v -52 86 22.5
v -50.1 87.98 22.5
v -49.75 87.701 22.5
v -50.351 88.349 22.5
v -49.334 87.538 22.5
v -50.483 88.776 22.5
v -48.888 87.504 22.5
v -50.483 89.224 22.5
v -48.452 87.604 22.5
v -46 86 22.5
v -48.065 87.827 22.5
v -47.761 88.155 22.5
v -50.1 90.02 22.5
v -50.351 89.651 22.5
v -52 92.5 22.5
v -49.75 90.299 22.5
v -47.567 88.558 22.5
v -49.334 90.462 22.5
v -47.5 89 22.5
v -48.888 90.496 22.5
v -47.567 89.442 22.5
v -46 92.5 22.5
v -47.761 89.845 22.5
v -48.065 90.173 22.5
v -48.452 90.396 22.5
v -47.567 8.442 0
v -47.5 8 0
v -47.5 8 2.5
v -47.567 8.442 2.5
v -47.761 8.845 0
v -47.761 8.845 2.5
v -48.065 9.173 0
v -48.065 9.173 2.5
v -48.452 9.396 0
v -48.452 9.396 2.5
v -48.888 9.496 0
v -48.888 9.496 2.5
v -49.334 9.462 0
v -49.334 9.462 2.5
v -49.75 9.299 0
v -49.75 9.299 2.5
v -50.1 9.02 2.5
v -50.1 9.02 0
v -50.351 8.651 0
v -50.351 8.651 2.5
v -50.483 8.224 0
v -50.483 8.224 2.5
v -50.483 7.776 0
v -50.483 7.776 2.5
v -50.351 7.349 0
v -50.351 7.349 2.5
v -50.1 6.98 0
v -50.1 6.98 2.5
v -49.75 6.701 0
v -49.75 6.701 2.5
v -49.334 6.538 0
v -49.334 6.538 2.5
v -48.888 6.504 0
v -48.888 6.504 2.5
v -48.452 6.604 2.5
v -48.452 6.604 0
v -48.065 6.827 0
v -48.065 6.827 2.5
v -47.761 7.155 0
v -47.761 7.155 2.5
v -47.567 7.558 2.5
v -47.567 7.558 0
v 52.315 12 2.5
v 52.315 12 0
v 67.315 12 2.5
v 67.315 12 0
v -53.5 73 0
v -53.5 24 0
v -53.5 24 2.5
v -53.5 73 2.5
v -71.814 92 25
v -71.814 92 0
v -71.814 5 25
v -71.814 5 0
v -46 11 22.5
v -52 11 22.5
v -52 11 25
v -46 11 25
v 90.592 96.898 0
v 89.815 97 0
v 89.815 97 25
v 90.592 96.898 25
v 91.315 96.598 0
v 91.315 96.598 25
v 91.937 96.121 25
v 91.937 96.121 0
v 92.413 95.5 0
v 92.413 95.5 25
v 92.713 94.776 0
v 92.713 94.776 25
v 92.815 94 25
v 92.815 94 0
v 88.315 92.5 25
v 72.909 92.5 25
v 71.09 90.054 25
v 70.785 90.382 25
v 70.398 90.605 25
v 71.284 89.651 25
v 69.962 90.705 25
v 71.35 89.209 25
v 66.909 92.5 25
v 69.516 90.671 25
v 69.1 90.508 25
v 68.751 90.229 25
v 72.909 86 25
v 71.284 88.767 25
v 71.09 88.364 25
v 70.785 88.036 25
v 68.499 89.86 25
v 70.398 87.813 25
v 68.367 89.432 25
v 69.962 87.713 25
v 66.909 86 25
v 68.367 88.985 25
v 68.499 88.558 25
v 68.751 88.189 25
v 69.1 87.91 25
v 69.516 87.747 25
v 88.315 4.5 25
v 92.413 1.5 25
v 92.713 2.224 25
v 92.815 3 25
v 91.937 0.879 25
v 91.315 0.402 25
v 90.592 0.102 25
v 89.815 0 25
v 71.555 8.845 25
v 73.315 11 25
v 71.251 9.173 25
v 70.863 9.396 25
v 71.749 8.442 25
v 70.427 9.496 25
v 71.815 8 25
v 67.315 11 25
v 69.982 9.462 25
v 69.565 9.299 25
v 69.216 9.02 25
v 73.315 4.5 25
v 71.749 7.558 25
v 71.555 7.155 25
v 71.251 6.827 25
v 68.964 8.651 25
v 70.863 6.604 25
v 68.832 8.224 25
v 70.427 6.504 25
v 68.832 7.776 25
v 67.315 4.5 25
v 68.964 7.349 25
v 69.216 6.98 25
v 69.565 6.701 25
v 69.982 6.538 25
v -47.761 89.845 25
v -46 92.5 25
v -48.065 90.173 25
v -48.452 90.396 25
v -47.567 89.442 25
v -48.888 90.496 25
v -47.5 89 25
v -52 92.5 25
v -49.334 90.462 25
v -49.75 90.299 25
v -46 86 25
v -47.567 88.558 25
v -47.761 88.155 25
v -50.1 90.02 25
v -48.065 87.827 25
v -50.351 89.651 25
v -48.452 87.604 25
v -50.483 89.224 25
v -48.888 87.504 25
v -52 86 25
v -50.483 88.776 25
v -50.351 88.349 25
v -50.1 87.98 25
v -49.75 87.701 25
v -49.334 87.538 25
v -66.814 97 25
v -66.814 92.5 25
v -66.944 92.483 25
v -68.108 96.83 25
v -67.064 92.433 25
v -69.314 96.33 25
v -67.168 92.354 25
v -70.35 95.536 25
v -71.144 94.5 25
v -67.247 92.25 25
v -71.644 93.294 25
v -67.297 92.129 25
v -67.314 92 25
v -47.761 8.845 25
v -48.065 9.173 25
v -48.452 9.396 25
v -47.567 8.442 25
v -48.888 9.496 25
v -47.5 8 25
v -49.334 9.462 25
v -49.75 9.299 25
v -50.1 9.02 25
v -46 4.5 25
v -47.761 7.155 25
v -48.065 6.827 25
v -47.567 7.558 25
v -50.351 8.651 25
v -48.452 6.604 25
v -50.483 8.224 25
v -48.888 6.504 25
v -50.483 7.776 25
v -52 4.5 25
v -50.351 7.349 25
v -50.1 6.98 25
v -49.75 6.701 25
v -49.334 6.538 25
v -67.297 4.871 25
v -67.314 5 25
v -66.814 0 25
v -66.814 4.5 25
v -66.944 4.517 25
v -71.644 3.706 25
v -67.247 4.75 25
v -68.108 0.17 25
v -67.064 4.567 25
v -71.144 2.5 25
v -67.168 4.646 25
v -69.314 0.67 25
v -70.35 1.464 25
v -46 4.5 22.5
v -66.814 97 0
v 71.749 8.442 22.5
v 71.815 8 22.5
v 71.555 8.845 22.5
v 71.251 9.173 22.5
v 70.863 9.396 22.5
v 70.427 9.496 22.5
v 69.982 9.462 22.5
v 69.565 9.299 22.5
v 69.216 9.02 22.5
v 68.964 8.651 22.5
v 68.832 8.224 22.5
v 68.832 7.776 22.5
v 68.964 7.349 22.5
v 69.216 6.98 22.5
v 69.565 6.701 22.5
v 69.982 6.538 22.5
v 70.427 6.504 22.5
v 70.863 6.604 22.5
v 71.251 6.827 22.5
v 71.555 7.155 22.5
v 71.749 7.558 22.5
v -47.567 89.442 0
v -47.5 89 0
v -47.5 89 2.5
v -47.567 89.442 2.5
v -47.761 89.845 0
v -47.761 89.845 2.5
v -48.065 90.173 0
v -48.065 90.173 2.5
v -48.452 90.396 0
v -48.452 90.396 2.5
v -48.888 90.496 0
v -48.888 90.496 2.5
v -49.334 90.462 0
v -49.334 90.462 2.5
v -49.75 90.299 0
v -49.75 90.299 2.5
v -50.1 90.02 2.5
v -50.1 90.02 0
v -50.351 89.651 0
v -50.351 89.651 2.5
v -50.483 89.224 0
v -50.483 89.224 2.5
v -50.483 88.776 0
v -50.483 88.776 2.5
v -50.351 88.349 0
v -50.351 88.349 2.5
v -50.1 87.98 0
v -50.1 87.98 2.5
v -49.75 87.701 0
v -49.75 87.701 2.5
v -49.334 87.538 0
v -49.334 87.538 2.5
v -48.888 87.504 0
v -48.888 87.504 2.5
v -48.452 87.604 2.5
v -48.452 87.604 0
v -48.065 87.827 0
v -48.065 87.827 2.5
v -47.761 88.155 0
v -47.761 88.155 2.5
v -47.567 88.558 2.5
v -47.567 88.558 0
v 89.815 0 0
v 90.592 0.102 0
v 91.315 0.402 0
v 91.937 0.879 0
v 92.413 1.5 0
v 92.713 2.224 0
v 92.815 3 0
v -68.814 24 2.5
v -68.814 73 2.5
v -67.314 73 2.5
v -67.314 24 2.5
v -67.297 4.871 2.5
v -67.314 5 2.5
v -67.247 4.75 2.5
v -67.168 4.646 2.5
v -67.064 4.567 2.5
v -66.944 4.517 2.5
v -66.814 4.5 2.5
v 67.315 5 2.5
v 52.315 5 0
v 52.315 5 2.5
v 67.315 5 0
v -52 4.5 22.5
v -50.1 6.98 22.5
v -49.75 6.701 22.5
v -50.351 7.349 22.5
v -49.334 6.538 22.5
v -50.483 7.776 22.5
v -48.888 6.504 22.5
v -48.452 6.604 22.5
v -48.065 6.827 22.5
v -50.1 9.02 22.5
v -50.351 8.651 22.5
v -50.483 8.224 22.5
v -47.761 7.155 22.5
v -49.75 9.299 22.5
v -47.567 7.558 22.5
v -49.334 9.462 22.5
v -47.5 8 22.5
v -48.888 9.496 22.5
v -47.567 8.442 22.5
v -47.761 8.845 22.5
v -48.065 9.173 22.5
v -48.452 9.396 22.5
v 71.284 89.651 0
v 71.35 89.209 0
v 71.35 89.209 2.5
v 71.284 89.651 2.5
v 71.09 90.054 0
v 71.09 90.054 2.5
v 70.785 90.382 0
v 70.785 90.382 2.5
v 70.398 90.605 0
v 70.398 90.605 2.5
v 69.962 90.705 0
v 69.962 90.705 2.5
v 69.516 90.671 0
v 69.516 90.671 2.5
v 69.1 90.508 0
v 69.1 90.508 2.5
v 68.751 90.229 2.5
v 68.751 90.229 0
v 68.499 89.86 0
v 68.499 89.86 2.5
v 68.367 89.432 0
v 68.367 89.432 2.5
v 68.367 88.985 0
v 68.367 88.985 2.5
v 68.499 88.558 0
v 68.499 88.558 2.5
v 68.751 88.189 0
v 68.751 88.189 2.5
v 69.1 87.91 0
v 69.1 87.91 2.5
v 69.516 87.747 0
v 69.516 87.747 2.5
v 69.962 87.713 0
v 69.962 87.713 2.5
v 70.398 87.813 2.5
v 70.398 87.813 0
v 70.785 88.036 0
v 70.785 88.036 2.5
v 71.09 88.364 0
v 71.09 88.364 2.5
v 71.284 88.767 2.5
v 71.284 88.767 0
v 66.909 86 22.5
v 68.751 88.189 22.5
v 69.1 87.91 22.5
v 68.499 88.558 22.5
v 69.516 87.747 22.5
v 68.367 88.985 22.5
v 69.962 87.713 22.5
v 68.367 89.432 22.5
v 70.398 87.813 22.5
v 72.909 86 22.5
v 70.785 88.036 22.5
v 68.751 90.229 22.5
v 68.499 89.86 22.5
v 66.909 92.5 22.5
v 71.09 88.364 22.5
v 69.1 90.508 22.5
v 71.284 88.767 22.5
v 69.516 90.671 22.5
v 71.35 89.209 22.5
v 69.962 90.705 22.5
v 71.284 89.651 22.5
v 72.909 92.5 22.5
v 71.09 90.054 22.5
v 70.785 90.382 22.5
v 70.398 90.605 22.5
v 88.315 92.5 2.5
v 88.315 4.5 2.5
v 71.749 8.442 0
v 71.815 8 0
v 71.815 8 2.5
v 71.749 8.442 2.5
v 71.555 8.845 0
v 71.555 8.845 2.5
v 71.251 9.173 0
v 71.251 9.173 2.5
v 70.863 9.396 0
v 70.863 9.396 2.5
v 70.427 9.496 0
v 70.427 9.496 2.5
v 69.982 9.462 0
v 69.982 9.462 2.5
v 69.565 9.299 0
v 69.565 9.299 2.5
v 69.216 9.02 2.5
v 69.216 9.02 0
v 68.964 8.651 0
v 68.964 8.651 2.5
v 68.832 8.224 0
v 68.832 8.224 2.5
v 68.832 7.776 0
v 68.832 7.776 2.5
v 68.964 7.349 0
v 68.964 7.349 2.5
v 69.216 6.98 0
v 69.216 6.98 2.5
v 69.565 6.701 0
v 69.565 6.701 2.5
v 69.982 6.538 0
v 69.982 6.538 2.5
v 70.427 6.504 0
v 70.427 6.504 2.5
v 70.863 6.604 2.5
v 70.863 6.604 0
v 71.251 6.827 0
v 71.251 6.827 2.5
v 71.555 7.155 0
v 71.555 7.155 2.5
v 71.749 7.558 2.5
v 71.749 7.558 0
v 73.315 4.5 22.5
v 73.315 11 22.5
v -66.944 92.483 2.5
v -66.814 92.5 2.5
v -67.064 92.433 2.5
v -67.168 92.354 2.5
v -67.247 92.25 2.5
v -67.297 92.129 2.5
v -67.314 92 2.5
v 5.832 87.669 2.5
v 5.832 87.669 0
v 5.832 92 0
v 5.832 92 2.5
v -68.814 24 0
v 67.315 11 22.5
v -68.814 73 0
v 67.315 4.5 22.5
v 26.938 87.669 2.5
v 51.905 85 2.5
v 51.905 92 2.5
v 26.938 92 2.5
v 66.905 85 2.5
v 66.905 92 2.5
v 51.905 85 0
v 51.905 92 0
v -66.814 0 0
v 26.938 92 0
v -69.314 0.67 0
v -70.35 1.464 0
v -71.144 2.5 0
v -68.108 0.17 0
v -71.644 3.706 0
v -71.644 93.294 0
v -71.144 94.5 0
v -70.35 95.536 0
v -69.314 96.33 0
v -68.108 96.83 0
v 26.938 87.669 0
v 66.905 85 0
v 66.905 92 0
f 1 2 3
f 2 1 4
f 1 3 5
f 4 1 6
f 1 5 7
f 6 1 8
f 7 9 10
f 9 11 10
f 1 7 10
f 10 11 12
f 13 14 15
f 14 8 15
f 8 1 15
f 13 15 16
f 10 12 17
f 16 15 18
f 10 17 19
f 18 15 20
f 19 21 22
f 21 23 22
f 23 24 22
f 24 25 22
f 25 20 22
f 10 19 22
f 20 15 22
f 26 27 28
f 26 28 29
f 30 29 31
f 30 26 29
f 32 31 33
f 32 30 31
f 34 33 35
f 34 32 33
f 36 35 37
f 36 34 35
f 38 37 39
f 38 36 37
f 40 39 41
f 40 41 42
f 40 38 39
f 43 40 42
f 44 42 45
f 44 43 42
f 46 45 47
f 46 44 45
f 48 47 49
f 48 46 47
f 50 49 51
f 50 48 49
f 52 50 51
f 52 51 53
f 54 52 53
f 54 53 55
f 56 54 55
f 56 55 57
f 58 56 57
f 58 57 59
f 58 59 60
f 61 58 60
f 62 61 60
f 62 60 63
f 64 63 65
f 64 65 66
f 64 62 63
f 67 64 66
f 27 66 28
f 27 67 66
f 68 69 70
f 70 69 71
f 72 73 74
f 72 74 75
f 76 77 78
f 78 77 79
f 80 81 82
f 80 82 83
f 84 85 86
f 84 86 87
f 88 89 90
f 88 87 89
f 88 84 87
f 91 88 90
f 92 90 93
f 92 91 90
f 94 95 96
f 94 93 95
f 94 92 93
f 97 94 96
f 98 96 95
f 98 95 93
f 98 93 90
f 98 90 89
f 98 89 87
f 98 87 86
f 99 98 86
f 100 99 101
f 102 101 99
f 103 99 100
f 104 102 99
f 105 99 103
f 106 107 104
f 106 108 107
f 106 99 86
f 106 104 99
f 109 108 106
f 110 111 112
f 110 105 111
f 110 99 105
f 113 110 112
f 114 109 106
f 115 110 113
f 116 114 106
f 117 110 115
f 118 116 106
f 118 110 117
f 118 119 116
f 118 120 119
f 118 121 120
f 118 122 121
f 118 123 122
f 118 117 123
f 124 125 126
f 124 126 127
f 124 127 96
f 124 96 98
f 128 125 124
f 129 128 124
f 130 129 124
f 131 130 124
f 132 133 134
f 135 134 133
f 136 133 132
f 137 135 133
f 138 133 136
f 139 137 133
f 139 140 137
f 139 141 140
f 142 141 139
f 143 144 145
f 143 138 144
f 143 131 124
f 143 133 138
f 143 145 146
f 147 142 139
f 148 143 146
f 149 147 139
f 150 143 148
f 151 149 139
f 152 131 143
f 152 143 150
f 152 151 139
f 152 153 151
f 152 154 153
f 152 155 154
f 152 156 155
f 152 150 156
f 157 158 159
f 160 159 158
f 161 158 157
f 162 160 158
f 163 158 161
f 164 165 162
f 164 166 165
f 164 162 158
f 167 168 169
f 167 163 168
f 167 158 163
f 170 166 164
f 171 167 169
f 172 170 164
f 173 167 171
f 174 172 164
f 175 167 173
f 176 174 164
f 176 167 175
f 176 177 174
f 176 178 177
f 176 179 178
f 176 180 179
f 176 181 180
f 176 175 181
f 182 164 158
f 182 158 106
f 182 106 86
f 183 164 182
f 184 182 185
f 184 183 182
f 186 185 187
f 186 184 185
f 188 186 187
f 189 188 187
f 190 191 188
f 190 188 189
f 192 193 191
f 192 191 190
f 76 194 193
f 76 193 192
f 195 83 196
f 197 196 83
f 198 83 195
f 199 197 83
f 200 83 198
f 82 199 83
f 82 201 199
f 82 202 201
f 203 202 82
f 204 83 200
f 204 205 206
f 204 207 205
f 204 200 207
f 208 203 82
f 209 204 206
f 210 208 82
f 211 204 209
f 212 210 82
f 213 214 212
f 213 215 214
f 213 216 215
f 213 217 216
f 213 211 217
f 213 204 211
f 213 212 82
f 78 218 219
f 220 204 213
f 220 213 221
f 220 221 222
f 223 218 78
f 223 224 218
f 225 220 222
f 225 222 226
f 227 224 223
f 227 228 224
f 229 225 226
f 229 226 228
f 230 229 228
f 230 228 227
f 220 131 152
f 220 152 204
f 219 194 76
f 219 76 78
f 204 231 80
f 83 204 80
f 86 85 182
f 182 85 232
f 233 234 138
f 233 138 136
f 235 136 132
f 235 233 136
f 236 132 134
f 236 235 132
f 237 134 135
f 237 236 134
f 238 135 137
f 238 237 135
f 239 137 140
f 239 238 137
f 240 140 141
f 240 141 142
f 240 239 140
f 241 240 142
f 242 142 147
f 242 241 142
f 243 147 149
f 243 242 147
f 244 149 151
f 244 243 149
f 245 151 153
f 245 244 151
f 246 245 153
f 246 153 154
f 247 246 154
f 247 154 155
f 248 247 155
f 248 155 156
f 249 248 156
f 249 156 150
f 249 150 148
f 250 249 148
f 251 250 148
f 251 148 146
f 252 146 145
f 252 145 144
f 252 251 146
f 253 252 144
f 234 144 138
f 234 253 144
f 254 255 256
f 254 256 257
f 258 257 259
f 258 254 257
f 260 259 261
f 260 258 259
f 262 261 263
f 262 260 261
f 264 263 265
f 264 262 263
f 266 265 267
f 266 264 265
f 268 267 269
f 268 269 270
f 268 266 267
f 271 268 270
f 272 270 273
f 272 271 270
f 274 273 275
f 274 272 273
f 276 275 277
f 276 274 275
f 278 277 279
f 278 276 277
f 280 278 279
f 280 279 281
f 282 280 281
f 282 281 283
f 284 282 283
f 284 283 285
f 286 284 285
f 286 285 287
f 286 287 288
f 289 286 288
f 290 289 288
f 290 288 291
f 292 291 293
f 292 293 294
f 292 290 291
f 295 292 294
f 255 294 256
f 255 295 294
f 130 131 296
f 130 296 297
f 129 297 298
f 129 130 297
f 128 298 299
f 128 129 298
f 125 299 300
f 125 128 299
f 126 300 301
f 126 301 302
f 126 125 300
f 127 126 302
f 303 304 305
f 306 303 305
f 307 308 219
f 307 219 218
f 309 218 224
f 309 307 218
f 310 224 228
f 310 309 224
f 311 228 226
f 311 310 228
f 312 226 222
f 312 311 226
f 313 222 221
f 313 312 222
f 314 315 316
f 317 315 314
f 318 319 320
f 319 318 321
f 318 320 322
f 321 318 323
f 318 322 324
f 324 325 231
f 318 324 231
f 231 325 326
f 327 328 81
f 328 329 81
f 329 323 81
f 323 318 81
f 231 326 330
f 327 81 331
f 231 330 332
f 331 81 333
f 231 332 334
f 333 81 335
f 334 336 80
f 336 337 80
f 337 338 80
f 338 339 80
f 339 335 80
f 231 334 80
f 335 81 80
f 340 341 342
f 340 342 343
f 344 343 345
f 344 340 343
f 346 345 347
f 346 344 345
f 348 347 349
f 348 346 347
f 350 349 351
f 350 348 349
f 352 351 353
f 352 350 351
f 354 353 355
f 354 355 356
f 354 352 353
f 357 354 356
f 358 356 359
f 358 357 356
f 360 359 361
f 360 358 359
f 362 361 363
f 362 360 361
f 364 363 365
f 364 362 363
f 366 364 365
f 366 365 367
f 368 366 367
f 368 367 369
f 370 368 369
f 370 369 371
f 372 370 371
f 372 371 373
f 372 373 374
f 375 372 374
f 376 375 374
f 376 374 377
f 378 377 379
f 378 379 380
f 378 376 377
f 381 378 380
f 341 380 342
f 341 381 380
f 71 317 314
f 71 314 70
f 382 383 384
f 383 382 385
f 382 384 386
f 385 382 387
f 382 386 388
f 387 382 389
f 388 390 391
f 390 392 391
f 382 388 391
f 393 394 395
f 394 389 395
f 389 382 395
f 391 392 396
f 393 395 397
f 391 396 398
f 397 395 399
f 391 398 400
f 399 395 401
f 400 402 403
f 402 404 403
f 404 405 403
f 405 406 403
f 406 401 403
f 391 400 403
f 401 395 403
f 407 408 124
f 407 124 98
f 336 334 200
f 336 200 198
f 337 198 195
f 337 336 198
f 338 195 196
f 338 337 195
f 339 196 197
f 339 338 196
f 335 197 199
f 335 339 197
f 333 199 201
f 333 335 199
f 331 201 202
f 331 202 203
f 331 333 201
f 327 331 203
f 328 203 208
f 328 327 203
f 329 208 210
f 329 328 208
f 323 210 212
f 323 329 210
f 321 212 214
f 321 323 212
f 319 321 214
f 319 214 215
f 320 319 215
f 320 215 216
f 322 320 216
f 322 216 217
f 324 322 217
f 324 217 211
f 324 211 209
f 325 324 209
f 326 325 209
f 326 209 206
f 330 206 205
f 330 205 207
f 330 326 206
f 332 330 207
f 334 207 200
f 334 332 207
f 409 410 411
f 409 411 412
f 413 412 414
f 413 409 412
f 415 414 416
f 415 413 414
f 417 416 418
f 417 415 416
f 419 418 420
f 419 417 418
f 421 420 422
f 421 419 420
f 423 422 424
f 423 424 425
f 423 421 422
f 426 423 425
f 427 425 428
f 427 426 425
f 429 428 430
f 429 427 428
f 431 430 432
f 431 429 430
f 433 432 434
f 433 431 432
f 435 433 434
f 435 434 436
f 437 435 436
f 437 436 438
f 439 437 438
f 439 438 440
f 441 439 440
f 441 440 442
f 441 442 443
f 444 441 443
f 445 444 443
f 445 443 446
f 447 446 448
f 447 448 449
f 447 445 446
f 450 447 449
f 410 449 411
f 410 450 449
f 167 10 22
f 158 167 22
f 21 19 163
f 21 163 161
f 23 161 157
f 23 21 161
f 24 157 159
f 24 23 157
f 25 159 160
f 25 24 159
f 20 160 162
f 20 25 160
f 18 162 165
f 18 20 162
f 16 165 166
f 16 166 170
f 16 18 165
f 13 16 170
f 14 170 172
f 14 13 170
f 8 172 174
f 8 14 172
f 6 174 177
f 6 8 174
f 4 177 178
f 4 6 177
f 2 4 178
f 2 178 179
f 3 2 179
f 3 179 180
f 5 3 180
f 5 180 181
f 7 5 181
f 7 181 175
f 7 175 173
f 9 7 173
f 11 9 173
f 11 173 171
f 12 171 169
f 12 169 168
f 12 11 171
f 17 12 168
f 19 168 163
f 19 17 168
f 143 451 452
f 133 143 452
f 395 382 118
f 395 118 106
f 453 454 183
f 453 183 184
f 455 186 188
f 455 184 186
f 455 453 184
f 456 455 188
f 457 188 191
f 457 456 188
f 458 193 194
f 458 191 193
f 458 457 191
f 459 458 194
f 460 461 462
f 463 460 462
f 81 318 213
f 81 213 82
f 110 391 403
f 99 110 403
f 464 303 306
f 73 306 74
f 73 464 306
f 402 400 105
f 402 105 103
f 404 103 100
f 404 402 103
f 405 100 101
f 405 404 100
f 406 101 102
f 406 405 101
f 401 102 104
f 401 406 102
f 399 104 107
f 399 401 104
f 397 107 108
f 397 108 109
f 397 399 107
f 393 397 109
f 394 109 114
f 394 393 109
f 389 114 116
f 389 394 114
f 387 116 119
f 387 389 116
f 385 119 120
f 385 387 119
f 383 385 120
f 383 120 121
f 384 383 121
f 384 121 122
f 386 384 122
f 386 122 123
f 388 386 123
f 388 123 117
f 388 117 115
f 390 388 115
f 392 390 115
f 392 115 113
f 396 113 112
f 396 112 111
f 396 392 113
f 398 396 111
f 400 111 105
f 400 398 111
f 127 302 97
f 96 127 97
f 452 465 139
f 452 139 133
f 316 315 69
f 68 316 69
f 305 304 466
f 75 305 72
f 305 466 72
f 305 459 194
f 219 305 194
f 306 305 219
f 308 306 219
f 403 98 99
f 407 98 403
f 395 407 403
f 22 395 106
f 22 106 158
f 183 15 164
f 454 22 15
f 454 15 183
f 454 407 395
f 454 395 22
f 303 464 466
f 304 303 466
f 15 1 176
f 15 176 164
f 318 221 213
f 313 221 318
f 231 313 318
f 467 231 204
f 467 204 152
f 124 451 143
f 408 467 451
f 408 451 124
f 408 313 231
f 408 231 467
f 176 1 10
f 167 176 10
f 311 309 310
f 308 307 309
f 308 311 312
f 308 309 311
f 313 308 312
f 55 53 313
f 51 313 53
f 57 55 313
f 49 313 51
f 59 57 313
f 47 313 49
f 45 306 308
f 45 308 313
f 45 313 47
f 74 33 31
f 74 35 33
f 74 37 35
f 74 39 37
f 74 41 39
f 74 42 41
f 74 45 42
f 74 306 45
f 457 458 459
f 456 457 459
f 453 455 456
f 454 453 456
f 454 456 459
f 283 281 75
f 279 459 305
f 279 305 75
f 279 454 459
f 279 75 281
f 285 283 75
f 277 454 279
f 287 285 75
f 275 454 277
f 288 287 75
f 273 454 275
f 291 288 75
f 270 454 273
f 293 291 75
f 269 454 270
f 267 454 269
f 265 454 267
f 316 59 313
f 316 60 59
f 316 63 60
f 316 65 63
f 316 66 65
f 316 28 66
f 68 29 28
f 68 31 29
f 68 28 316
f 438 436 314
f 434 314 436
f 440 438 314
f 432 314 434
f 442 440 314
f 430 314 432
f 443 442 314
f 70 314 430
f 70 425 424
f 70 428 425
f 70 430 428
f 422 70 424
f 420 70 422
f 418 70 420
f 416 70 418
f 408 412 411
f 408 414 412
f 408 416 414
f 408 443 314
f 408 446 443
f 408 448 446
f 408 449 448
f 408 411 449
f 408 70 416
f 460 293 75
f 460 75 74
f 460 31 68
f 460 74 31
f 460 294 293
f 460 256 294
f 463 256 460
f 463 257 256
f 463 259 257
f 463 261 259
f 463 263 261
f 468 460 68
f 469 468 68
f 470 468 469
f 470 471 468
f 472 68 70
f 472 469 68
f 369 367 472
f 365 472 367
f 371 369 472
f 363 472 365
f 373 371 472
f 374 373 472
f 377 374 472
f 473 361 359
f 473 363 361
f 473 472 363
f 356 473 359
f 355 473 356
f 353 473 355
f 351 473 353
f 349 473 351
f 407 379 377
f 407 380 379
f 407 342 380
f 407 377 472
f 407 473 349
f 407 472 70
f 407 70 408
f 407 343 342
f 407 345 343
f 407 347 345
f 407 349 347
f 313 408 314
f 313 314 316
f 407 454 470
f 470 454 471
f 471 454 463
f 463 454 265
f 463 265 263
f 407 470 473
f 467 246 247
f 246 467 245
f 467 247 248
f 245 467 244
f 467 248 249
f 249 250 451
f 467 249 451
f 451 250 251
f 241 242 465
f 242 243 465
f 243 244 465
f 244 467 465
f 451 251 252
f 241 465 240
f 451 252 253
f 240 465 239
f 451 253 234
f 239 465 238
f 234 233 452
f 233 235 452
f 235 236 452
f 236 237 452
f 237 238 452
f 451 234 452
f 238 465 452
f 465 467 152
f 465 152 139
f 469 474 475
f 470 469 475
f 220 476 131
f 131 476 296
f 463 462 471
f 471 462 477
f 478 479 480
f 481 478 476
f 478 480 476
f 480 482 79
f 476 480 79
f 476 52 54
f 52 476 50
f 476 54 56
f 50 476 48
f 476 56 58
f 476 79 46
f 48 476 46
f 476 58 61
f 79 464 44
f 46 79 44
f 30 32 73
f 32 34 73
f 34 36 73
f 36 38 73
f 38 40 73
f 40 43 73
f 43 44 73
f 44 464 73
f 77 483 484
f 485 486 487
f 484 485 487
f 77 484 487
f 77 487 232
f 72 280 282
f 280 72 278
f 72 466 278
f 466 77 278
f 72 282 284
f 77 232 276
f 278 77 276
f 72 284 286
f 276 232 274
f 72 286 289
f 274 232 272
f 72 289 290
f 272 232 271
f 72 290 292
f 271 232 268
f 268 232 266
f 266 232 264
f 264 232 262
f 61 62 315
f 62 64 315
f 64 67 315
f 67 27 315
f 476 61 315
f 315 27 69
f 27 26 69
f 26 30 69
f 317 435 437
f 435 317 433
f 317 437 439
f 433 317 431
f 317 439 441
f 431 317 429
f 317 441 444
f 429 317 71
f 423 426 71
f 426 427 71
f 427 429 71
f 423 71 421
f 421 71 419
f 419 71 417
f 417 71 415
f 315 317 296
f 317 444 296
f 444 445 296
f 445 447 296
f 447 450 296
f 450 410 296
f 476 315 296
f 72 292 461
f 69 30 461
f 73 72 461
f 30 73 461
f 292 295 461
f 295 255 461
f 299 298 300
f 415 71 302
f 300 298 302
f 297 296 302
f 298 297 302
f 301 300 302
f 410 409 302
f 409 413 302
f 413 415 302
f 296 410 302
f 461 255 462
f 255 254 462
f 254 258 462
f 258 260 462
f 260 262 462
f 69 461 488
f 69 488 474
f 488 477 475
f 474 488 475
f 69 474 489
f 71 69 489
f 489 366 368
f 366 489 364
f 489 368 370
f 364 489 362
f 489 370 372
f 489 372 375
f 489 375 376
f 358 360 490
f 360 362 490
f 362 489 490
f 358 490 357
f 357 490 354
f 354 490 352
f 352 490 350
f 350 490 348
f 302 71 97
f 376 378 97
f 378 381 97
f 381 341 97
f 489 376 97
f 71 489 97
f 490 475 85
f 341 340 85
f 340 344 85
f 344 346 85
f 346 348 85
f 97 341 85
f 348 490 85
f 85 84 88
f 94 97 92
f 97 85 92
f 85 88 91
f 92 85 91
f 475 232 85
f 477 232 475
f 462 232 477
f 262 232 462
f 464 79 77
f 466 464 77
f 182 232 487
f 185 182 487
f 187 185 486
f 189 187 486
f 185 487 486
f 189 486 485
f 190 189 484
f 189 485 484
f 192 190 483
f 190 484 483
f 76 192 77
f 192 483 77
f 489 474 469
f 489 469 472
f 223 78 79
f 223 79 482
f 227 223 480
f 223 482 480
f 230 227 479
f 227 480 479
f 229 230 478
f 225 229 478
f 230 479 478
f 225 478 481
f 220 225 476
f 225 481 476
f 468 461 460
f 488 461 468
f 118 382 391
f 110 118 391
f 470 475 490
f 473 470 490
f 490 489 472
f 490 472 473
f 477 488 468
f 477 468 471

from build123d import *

# Parameters (mm, degrees)
CROQUIS1_W              = 15
CROQUIS1_H              = 7
CROQUIS1_W_2            = 21.106040847
CROQUIS1_H_2            = 4.330702007
CROQUIS1_R              = 1.5
CROQUIS1_W_3            = 15.314275766
CROQUIS1_H_3            = 48.999512223
SALIENTE_EXTRUIR1_DEPTH = 2.5
SALIENTE_EXTRUIR2_DEPTH = 25.5
SALIENTE_EXTRUIR3_REACH = 135.996
CROQUIS3_W              = 155.129666141
CROQUIS3_H              = 2
REDONDEO1_R             = 3
REDONDEO2_R             = 3
CROQUIS6_W              = 172.033889696
CROQUIS6_H              = 4.948845102
CORTAR_EXTRUIR3_DEPTH   = 114.5
SALIENTE_EXTRUIR4_START = -2.5
CROQUIS7_W              = 6
CROQUIS7_H              = 6.5
CROQUIS7_R              = 1.5
SALIENTE_EXTRUIR4_DEPTH = 2.5


with BuildPart() as part:
    # Croquis1 → Saliente-Extruir1 (new body)
    with BuildSketch(Plane.XY):
        with BuildLine():
            Line((92.815390375, 97), (-66.814275766, 97))
            ThreePointArc((-66.814275766, 97), (-70.349809672, 95.535533906), (-71.814275766, 92))
            Line((-71.814275766, 92), (-71.814275766, 5))
            ThreePointArc((-71.814275766, 5), (-70.349809672, 1.464466094), (-66.814275766, 0))
            Line((-66.814275766, 0), (92.815390375, 0))
            Line((92.815390375, 0), (92.815390375, 97))
        make_face()
        with Locations((59.815390375, 8.5)):
            Rectangle(CROQUIS1_W, CROQUIS1_H, mode=Mode.SUBTRACT)
        with Locations((16.385259295, 89.834648996)):
            Rectangle(CROQUIS1_W_2, CROQUIS1_H_2, mode=Mode.SUBTRACT)
        with Locations((59.404912693, 88.5)):
            Rectangle(CROQUIS1_W, CROQUIS1_H, mode=Mode.SUBTRACT)
        with Locations((-49, 8)):
            Circle(CROQUIS1_R, mode=Mode.SUBTRACT)
        with Locations((-61.157137883, 48.499756112)):
            Rectangle(CROQUIS1_W_3, CROQUIS1_H_3, mode=Mode.SUBTRACT)
        with Locations((70.315390375, 8)):
            Circle(CROQUIS1_R, mode=Mode.SUBTRACT)
        with Locations((-49, 89)):
            Circle(CROQUIS1_R, mode=Mode.SUBTRACT)
        with Locations((69.850202166, 89.208902584)):
            Circle(CROQUIS1_R, mode=Mode.SUBTRACT)
    extrude(amount=SALIENTE_EXTRUIR1_DEPTH)

    # Croquis2 → Saliente-Extruir2 (add)
    with BuildSketch(Plane.XY.offset(2.5)):
        with BuildLine():
            Line((-71.814275766, 92), (-71.814275766, 5))
            ThreePointArc((-71.814275766, 5), (-70.349809672, 1.464466094), (-66.814275766, 0))
            Line((-66.814275766, 0), (92.815390375, 0))
            Line((92.815390375, 0), (92.815390375, 97))
            Line((92.815390375, 97), (-66.814275766, 97))
            ThreePointArc((-66.814275766, 97), (-70.349809672, 95.535533906), (-71.814275766, 92))
        make_face()
        with BuildLine():
            Line((-67.314275766, 92), (-67.314275766, 5))
            ThreePointArc((-67.314275766, 5), (-67.167829157, 4.646446609), (-66.814275766, 4.5))
            Line((-66.814275766, 4.5), (88.315390375, 4.5))
            Line((88.315390375, 4.5), (88.315390375, 92.5))
            Line((88.315390375, 92.5), (-66.814275766, 92.5))
            ThreePointArc((-66.814275766, 92.5), (-67.167829157, 92.353553391), (-67.314275766, 92))
        make_face(mode=Mode.SUBTRACT)
    extrude(amount=SALIENTE_EXTRUIR2_DEPTH)

    # Croquis3 → Saliente-Extruir3 (add, up to next)
    with BuildSketch(Plane(origin=(0, 4.5, 0), x_dir=(1, 0, 0), z_dir=(0, 1, 0)), mode=Mode.PRIVATE) as saliente_extruir3_sk1:
        with Locations((10.750557304, -27)):
            Rectangle(CROQUIS3_W, CROQUIS3_H)
    saliente_extruir3_tool1 = extrude(saliente_extruir3_sk1.sketch, amount=SALIENTE_EXTRUIR3_REACH, mode=Mode.PRIVATE) - part.part
    add(saliente_extruir3_tool1.solids().sort_by_distance((10.750557, 4.5, 27))[0])

    # Redondeo1
    redondeo1_edges = [part.edges().sort_by_distance(p)[0] for p in [
        (92.815390375, 97, 14),
        (92.815390375, 0, 14),
    ]]
    fillet(redondeo1_edges, radius=REDONDEO1_R)

    # Redondeo2
    redondeo2_edges = [part.edges().sort_by_distance(p)[0] for p in [
        (92.815390375, 48.5, 28),
        (11.500557304, 97, 28),
        (91.936710719, 96.121320344, 28),
        (91.936710719, 0.878679656, 28),
        (-70.349809672, 95.535533906, 28),
        (-71.814275766, 48.5, 28),
        (-70.349809672, 1.464466094, 28),
        (11.500557304, 0, 28),
    ]]
    fillet(redondeo2_edges, radius=REDONDEO2_R)

    # Croquis6 → Cortar-Extruir3 (cut)
    with BuildSketch(Plane(origin=(0, 0, 0), x_dir=(-1, 0, 0), z_dir=(0, -1, 0))):
        with Locations((-6.798445527, -27.474422551)):
            Rectangle(CROQUIS6_W, CROQUIS6_H)
    extrude(amount=-CORTAR_EXTRUIR3_DEPTH, mode=Mode.SUBTRACT)

    # Croquis7 → Saliente-Extruir4 (add)
    # profile 1 of 4: a face of its own
    with BuildSketch(Plane.XY.offset(25).offset(SALIENTE_EXTRUIR4_START)):
        with Locations((69.908799209, 89.25)):
            Rectangle(CROQUIS7_W, CROQUIS7_H)
        with Locations((69.850202166, 89.208902584)):
            Circle(CROQUIS7_R, mode=Mode.SUBTRACT)
    # profile 2 of 4: a face of its own
    with BuildSketch(Plane.XY.offset(25).offset(SALIENTE_EXTRUIR4_START)):
        with Locations((-49, 89.25)):
            Rectangle(CROQUIS7_W, CROQUIS7_H)
        with Locations((-49, 89)):
            Circle(CROQUIS7_R, mode=Mode.SUBTRACT)
    # profile 3 of 4: a face of its own
    with BuildSketch(Plane.XY.offset(25).offset(SALIENTE_EXTRUIR4_START)):
        with Locations((70.315390375, 7.75)):
            Rectangle(CROQUIS7_W, CROQUIS7_H)
        with Locations((70.315390375, 8)):
            Circle(CROQUIS7_R, mode=Mode.SUBTRACT)
    # profile 4 of 4: a face of its own
    with BuildSketch(Plane.XY.offset(25).offset(SALIENTE_EXTRUIR4_START)):
        with Locations((-49, 7.75)):
            Rectangle(CROQUIS7_W, CROQUIS7_H)
        with Locations((-49, 8)):
            Circle(CROQUIS7_R, mode=Mode.SUBTRACT)
    extrude(amount=SALIENTE_EXTRUIR4_DEPTH)


solid = part.part
